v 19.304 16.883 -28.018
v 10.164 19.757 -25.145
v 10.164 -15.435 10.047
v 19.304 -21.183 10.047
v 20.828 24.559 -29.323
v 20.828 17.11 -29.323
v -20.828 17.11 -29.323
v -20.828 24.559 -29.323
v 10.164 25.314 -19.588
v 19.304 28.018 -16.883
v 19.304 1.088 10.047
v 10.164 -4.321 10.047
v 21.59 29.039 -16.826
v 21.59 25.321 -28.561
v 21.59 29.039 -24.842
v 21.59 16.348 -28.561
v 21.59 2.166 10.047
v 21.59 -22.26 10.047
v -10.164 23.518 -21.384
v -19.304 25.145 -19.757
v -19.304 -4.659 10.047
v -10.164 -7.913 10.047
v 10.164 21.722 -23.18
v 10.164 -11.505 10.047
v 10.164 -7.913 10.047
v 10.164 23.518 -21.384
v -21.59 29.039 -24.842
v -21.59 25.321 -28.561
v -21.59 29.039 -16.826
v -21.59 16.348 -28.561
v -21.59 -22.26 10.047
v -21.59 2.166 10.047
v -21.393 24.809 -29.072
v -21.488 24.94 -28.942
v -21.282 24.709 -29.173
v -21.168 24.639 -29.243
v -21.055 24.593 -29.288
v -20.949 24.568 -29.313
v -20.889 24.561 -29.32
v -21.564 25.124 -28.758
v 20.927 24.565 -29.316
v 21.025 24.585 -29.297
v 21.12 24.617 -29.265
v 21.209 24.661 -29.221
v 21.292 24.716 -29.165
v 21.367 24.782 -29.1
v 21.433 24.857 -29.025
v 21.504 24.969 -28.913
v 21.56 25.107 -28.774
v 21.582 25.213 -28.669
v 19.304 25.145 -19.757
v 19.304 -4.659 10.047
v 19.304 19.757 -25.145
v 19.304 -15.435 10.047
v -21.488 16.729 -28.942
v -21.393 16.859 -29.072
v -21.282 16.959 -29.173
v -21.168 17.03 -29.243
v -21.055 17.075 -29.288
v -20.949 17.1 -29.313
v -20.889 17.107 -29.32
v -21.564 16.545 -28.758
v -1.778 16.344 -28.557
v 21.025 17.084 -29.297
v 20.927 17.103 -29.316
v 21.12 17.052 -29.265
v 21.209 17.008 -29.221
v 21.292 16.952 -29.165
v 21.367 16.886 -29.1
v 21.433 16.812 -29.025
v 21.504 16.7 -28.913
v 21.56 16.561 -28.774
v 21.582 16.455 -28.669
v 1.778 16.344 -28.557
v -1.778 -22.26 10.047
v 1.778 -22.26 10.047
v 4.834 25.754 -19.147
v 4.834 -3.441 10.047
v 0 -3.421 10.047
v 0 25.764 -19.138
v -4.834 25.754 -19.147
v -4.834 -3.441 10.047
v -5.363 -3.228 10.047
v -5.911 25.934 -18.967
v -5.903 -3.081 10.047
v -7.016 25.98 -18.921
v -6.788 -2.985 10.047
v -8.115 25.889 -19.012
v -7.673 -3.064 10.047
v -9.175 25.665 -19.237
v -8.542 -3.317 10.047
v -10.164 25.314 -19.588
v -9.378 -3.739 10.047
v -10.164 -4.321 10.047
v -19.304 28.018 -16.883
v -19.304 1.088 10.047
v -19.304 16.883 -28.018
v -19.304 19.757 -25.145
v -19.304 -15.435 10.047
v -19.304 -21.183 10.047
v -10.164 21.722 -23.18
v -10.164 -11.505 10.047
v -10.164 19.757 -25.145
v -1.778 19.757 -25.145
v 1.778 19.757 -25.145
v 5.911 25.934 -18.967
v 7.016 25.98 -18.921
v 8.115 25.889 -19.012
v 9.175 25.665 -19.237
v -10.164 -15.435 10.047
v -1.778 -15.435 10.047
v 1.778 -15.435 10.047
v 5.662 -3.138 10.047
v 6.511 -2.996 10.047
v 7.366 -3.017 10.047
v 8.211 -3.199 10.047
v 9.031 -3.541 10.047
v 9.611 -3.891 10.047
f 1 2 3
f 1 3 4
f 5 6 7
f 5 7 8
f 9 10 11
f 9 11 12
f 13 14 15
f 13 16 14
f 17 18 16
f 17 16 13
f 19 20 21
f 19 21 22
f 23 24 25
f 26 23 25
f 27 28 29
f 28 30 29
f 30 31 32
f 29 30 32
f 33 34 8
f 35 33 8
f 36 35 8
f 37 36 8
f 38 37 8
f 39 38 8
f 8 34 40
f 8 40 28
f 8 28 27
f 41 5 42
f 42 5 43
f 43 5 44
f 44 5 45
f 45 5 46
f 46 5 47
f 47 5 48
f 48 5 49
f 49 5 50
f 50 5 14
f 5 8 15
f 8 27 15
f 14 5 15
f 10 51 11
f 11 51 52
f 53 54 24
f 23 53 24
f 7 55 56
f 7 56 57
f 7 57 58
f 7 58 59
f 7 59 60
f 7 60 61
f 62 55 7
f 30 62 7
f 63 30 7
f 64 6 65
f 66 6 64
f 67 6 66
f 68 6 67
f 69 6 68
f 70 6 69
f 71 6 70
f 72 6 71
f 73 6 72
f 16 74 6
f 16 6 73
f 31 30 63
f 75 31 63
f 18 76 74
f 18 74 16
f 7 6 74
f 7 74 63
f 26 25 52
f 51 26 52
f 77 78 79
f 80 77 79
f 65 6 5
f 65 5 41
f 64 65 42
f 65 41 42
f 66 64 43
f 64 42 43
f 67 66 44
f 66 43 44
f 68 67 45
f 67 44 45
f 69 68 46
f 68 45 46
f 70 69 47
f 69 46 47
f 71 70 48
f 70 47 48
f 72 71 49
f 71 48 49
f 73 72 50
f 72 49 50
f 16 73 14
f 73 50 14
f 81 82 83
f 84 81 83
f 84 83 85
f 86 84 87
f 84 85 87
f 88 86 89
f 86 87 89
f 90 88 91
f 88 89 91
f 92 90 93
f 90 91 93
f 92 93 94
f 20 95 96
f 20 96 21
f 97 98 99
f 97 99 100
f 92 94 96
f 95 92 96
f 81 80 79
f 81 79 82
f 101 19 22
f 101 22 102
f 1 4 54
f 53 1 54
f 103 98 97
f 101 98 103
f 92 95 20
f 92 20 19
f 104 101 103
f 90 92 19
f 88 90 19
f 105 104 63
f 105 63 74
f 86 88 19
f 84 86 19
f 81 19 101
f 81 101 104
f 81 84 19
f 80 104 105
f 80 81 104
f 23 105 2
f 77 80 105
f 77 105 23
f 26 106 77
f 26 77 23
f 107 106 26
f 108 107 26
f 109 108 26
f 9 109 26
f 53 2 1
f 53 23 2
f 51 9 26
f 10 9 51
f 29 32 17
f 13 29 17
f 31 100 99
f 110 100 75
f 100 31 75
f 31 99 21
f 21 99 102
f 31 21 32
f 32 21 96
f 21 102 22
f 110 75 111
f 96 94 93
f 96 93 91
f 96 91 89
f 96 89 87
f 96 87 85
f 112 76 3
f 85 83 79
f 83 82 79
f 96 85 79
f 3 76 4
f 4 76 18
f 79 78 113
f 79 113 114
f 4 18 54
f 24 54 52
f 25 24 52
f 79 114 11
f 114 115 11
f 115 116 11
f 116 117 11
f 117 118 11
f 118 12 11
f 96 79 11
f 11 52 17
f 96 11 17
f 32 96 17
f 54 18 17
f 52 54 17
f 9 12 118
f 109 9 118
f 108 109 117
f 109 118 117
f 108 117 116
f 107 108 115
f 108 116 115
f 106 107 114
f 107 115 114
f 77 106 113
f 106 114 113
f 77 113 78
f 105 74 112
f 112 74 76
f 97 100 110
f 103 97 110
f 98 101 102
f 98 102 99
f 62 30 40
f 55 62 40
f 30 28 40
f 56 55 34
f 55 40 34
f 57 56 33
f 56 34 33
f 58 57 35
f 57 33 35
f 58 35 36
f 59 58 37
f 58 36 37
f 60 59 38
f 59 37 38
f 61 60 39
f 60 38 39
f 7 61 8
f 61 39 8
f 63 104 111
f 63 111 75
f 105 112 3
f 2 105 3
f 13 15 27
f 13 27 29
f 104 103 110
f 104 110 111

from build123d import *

# Parameters (mm, degrees)
F0_W     = 43.18
F0_H     = 17.272
F2_DEPTH = 76.2
F3_DEPTH = 69.85
F6_ANGLE = 45
F8_W     = 97.1712954342
F8_H     = 80.9760764241
F8_W_2   = 68.9119933241
F8_H_2   = 39.37
F9_DEPTH = 38.1
F10_R    = 0.762


# Not quite as in the source:
# - ends of sketch curves that miss each other by under 0.0002 mm in the source are joined


with BuildPart() as f2:
    # F0 (on Front) → F2 (new body)
    with BuildSketch(Plane.XZ):
        Rectangle(F0_W, F0_H)
    extrude(amount=-F2_DEPTH)

    # F1 (on Front) → F3 (cut)
    with BuildSketch(Plane.XZ):
        with BuildLine():
            Line((10.1640512741, -1.0311319662), (10.1640512741, 1.5088680338))
            Line((10.1640512741, 1.5088680338), (19.304, 3.81))
            Line((19.304, 3.81), (19.304, 7.874))
            Line((19.304, 7.874), (10.1640512741, 4.0488680338))
            ThreePointArc((10.1640512741, 4.0488680338), (7.567989059, 4.950925683), (4.8339106143, 4.6715297537))
            Line((4.8339106143, 4.6715297537), (1.97346e-05, 4.6852644338))
            Line((1.97346e-05, 4.6852644338), (-4.8339106143, 4.6715297537))
            ThreePointArc((-4.8339106143, 4.6715297537), (-7.567989059, 4.950925683), (-10.1640512741, 4.0488680338))
            Line((-10.1640512741, 4.0488680338), (-19.304, 7.874))
            Line((-19.304, 7.874), (-19.304, 3.81))
            Line((-19.304, 3.81), (-10.1640512741, 1.5088680338))
            Line((-10.1640512741, 1.5088680338), (-10.1640512741, -1.0311319662))
            Line((-10.1640512741, -1.0311319662), (-19.304, -3.81))
            Line((-19.304, -3.81), (-19.304, -7.874))
            Line((-19.304, -7.874), (-10.1640512741, -3.81))
            Line((-10.1640512741, -3.81), (-1.778, -3.81))
            Line((-1.778, -3.81), (-1.778, -7.874))
            Line((-1.778, -7.874), (-1.778, -8.9796995744))
            Line((-1.778, -8.9796995744), (1.778, -8.9796995744))
            Line((1.778, -8.9796995744), (1.778, -7.874))
            Line((1.778, -7.874), (1.778, -3.81))
            Line((1.778, -3.81), (10.1640512741, -3.81))
            Line((10.1640512741, -3.81), (19.304, -7.874))
            Line((19.304, -7.874), (19.304, -3.81))
            Line((19.304, -3.81), (10.1640512741, -1.0311319662))
        make_face()
    extrude(amount=-F3_DEPTH, mode=Mode.SUBTRACT)


with BuildPart() as f2_1:
    # F4: moved
    add(f2.part.moved(Location((0, -38.1, 0))))


with BuildPart() as f2_2:
    # F6: moved
    add(f2_1.part.rotate(Axis((-4.1610468179, 0, 0), (-1, 0, 0)), F6_ANGLE))

    # F8 (on Right) → F9 (cut, symmetric)
    with BuildSketch(Plane.YZ):
        with Locations((-6.1953347176, -4.1167326272)):
            Rectangle(F8_W, F8_H)
        with Locations((-5.4169551435, -9.6378130603)):
            Rectangle(F8_W_2, F8_H_2, mode=Mode.SUBTRACT)
    extrude(amount=F9_DEPTH, both=True, mode=Mode.SUBTRACT)

    # F10
    f10_edges = [f2_2.edges().sort_by_distance(p)[0] for p in [
        (21.59, 20.834194, -29.322813),
        (-21.59, 20.834194, -29.322813),
    ]]
    fillet(f10_edges, radius=F10_R)


solid = f2_2.part
